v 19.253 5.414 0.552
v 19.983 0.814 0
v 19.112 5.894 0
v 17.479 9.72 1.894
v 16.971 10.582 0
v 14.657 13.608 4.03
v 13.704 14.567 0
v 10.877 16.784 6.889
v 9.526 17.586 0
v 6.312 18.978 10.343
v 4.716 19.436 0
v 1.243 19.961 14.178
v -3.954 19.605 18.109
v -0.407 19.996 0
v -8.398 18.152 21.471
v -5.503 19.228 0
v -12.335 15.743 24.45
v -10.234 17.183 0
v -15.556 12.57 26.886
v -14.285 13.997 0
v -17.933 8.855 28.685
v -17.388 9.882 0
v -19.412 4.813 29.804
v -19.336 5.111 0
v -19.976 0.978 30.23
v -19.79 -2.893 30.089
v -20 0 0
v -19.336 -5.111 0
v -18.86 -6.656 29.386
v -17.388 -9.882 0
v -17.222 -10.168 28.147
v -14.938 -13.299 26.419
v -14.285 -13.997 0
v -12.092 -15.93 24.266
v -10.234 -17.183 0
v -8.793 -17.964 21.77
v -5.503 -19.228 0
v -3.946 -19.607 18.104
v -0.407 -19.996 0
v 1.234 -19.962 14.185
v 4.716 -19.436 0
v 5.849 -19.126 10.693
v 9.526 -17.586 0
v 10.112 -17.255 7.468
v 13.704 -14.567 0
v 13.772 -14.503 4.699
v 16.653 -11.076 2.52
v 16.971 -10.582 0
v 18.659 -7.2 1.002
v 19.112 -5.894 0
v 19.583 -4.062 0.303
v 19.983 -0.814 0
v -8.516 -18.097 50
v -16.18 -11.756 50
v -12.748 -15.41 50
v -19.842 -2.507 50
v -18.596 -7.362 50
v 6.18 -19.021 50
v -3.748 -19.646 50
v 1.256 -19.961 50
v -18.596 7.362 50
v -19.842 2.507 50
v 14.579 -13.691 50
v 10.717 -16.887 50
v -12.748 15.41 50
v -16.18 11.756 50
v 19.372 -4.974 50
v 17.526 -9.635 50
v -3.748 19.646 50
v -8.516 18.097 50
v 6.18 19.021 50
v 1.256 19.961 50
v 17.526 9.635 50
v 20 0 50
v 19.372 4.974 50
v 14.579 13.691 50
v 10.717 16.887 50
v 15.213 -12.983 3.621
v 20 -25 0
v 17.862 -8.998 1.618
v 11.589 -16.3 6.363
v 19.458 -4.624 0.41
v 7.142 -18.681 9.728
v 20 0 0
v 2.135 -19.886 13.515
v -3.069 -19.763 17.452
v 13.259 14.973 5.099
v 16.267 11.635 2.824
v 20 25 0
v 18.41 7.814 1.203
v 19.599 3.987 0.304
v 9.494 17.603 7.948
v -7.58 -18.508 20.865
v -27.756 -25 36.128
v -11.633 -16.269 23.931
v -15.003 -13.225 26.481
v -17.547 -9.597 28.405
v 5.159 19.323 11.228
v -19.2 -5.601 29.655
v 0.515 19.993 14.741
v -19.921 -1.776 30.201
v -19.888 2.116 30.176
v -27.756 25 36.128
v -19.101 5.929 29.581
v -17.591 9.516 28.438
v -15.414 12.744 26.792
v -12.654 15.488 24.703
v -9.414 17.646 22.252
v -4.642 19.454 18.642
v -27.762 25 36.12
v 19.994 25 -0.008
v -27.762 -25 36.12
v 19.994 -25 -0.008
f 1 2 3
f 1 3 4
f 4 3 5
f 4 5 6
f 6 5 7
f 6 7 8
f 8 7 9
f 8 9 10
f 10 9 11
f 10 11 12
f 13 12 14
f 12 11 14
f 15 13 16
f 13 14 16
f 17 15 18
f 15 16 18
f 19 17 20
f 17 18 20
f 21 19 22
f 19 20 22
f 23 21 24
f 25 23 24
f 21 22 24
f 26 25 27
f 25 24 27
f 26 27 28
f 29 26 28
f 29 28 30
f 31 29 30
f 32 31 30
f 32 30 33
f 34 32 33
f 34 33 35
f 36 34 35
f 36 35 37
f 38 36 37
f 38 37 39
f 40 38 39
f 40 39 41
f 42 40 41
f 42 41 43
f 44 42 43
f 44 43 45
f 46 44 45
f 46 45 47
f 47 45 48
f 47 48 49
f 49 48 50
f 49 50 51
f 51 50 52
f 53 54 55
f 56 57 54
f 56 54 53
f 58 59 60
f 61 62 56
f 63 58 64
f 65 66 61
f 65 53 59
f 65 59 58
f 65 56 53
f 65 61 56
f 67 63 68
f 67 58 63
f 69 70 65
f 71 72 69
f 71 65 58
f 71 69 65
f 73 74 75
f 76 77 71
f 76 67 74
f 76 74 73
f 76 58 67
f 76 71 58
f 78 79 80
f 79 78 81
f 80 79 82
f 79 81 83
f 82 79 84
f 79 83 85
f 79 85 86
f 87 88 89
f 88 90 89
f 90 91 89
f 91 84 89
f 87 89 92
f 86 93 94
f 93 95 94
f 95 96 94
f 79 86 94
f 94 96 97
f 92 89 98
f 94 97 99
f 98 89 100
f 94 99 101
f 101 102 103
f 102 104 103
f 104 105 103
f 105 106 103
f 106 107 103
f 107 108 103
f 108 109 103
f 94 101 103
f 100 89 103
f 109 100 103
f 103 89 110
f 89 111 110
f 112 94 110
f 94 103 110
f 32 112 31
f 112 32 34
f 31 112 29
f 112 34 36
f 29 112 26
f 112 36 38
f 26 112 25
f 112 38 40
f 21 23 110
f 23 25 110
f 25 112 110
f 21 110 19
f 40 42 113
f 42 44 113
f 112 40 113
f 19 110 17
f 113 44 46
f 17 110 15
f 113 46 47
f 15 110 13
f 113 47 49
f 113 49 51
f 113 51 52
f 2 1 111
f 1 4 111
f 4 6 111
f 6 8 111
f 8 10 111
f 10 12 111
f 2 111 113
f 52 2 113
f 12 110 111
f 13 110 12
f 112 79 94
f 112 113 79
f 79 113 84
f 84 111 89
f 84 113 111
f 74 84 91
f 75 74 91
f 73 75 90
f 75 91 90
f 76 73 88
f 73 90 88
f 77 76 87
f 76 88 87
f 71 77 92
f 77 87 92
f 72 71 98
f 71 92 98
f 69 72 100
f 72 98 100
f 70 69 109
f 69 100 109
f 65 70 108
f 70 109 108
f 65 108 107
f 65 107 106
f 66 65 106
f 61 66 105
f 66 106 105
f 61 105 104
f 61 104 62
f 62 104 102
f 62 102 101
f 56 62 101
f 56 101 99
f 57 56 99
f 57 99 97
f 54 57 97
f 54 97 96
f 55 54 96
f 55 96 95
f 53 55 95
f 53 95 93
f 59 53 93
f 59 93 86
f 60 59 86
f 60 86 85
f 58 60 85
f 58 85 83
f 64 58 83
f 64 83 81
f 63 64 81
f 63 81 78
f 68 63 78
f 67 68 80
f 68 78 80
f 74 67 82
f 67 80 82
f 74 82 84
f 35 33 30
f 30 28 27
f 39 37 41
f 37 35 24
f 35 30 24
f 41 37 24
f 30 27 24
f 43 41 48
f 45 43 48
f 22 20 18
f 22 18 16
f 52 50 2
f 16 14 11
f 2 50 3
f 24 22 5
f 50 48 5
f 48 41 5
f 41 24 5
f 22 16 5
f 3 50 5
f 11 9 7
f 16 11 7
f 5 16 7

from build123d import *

# Parameters (mm, degrees)
SKETCH_1_R        = 20
EXTRUDE_1_DEPTH   = 50
EXTRUDE_1_2_DEPTH = 25


with BuildPart() as part:
    # 草图1 → Extrude 1 (new body)
    with BuildSketch(Plane.XY):
        Circle(SKETCH_1_R)
    extrude(amount=EXTRUDE_1_DEPTH)

    # 草图3 → Extrude 1 2 (add, symmetric)
    with BuildSketch(Plane(origin=(0, 0, 0), x_dir=(1, 0, 0), z_dir=(0, 1, 0))):
        Polygon((20, 0), (-27.7557358, -36.128356044), (-27.761769046, -36.120381086), (19.993966754, 0.007974957), align=None)
    extrude(amount=EXTRUDE_1_2_DEPTH, both=True)


solid = part.part
